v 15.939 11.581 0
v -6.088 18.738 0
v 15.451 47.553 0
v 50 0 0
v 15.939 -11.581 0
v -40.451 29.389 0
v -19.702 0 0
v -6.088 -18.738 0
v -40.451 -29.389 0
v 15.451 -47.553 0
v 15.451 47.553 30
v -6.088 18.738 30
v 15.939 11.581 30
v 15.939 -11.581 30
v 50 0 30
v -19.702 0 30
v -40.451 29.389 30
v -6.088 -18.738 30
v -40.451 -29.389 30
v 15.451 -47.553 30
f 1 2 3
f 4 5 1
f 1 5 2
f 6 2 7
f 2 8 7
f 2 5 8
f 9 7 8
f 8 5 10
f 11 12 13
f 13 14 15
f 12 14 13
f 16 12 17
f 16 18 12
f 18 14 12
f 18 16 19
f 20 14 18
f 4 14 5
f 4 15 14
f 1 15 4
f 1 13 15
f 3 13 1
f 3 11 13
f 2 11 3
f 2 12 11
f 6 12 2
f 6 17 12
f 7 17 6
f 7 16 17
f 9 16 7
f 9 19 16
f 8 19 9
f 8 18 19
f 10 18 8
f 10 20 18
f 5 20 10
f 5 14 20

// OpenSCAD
// POINTY STAR
// fully parameterized pointy star
//
// created by Moritz Walter 2014
// iamnotachoice.com
// released under GPLv3 http://www.gnu.org/licenses/gpl.html

boxheight=30;
cornerCount = 5;
starRadius = 50;
cornerWidth = 17;
cornerHeight = 15;
cornerFN = 4;
maniFix=0.01;
vegger=2;
lokk=false;
boks=true;

// experimental
useExperimentalTruncation=false;

// Boks
if (boks) {
    linear_extrude(boxheight)
        projection()
            halveStar();
}

// Lokk
if (lokk) {
    translate([0,0,boxheight]) {
        halveStar();
    }
}

module halveStar(){
	difference(){
		star();
		translate([0,0,-cornerHeight])
			cylinder(r=1.3*starRadius,h=2*cornerHeight,center=true,$fn=cornerCount);
	}
}

module star() {
	union(){
		for( i=[1:1:cornerCount] ) {
			rotate( [0,0,360/cornerCount * i] )
				truncatedCorner();
		}
		manifoldFix();
		scale([1,1,-1])
			manifoldFix();
	}
}

module manifoldFix(){
	translate([0,0,cornerHeight/2])
		cylinder(r1=cornerHeight, r2=0,h=cornerHeight+maniFix,center=true);
}

module truncatedCorner(){
	difference(){
		corner();
		translate([-starRadius/2,0,0] )
			cube([starRadius,starRadius,starRadius],center=true);
		if(useExperimentalTruncation){
			rotate([0,0,180/cornerCount])
				translate( [starRadius/2,cornerWidth,0] )
					cube([starRadius,2*cornerWidth,2*cornerHeight],center=true);
			rotate([0,0,-180/cornerCount])
				translate( [starRadius/2,-cornerWidth,0] )
					cube([starRadius,2*cornerWidth,2*cornerHeight],center=true);
		}

	}
}

module corner(){
	scale( [starRadius,cornerWidth,cornerHeight] )
		rotate([0,90,0])
			translate([0,0,0.5])
				cylinder( r1=1, r2=0, h=1, $fn = cornerFN, center=true );

}

module experimentalCorner(){
	for(i=[1:1:cornerSegmentCount]){
		// angle=90-i*90/cornerSegmentCount
		// lastAngle=90-(i-1)*90/cornerSegmentCount
		// x=cos(lastAngle)*starRadius
		// h=(cos(angle)-cos(lastAngle))*starRadius
		// r1=sin(lastAngle);
		// r2=sin(angle)

		// x=cos(90-(i-1)*90/cornerSegmentCount)*starRadius
		// h=(cos(90-i*90/cornerSegmentCount)-cos(90-(i-1)*90/cornerSegmentCount))*starRadius
		// r1=sin(90-(i-1)*90/cornerSegmentCount);
		// r2=sin(90-i*90/cornerSegmentCount)
		scale([1,cornerWidth,cornerHeight])
			translate([(cos(90-i*90/cornerSegmentCount)-cos(90-(i-1)*90/cornerSegmentCount))*starRadius/2+cos(90-(i-1)*90/cornerSegmentCount)*starRadius,0,0] )
				rotate( [0,90,0] )
					cylinder( h=(cos(90-i*90/cornerSegmentCount)-cos(90-(i-1)*90/cornerSegmentCount))*starRadius, r1=sin(90-(i-1)*90/cornerSegmentCount), r2=sin(90-i*90/cornerSegmentCount), $fn = cornerFN, center=true );
	}
}
